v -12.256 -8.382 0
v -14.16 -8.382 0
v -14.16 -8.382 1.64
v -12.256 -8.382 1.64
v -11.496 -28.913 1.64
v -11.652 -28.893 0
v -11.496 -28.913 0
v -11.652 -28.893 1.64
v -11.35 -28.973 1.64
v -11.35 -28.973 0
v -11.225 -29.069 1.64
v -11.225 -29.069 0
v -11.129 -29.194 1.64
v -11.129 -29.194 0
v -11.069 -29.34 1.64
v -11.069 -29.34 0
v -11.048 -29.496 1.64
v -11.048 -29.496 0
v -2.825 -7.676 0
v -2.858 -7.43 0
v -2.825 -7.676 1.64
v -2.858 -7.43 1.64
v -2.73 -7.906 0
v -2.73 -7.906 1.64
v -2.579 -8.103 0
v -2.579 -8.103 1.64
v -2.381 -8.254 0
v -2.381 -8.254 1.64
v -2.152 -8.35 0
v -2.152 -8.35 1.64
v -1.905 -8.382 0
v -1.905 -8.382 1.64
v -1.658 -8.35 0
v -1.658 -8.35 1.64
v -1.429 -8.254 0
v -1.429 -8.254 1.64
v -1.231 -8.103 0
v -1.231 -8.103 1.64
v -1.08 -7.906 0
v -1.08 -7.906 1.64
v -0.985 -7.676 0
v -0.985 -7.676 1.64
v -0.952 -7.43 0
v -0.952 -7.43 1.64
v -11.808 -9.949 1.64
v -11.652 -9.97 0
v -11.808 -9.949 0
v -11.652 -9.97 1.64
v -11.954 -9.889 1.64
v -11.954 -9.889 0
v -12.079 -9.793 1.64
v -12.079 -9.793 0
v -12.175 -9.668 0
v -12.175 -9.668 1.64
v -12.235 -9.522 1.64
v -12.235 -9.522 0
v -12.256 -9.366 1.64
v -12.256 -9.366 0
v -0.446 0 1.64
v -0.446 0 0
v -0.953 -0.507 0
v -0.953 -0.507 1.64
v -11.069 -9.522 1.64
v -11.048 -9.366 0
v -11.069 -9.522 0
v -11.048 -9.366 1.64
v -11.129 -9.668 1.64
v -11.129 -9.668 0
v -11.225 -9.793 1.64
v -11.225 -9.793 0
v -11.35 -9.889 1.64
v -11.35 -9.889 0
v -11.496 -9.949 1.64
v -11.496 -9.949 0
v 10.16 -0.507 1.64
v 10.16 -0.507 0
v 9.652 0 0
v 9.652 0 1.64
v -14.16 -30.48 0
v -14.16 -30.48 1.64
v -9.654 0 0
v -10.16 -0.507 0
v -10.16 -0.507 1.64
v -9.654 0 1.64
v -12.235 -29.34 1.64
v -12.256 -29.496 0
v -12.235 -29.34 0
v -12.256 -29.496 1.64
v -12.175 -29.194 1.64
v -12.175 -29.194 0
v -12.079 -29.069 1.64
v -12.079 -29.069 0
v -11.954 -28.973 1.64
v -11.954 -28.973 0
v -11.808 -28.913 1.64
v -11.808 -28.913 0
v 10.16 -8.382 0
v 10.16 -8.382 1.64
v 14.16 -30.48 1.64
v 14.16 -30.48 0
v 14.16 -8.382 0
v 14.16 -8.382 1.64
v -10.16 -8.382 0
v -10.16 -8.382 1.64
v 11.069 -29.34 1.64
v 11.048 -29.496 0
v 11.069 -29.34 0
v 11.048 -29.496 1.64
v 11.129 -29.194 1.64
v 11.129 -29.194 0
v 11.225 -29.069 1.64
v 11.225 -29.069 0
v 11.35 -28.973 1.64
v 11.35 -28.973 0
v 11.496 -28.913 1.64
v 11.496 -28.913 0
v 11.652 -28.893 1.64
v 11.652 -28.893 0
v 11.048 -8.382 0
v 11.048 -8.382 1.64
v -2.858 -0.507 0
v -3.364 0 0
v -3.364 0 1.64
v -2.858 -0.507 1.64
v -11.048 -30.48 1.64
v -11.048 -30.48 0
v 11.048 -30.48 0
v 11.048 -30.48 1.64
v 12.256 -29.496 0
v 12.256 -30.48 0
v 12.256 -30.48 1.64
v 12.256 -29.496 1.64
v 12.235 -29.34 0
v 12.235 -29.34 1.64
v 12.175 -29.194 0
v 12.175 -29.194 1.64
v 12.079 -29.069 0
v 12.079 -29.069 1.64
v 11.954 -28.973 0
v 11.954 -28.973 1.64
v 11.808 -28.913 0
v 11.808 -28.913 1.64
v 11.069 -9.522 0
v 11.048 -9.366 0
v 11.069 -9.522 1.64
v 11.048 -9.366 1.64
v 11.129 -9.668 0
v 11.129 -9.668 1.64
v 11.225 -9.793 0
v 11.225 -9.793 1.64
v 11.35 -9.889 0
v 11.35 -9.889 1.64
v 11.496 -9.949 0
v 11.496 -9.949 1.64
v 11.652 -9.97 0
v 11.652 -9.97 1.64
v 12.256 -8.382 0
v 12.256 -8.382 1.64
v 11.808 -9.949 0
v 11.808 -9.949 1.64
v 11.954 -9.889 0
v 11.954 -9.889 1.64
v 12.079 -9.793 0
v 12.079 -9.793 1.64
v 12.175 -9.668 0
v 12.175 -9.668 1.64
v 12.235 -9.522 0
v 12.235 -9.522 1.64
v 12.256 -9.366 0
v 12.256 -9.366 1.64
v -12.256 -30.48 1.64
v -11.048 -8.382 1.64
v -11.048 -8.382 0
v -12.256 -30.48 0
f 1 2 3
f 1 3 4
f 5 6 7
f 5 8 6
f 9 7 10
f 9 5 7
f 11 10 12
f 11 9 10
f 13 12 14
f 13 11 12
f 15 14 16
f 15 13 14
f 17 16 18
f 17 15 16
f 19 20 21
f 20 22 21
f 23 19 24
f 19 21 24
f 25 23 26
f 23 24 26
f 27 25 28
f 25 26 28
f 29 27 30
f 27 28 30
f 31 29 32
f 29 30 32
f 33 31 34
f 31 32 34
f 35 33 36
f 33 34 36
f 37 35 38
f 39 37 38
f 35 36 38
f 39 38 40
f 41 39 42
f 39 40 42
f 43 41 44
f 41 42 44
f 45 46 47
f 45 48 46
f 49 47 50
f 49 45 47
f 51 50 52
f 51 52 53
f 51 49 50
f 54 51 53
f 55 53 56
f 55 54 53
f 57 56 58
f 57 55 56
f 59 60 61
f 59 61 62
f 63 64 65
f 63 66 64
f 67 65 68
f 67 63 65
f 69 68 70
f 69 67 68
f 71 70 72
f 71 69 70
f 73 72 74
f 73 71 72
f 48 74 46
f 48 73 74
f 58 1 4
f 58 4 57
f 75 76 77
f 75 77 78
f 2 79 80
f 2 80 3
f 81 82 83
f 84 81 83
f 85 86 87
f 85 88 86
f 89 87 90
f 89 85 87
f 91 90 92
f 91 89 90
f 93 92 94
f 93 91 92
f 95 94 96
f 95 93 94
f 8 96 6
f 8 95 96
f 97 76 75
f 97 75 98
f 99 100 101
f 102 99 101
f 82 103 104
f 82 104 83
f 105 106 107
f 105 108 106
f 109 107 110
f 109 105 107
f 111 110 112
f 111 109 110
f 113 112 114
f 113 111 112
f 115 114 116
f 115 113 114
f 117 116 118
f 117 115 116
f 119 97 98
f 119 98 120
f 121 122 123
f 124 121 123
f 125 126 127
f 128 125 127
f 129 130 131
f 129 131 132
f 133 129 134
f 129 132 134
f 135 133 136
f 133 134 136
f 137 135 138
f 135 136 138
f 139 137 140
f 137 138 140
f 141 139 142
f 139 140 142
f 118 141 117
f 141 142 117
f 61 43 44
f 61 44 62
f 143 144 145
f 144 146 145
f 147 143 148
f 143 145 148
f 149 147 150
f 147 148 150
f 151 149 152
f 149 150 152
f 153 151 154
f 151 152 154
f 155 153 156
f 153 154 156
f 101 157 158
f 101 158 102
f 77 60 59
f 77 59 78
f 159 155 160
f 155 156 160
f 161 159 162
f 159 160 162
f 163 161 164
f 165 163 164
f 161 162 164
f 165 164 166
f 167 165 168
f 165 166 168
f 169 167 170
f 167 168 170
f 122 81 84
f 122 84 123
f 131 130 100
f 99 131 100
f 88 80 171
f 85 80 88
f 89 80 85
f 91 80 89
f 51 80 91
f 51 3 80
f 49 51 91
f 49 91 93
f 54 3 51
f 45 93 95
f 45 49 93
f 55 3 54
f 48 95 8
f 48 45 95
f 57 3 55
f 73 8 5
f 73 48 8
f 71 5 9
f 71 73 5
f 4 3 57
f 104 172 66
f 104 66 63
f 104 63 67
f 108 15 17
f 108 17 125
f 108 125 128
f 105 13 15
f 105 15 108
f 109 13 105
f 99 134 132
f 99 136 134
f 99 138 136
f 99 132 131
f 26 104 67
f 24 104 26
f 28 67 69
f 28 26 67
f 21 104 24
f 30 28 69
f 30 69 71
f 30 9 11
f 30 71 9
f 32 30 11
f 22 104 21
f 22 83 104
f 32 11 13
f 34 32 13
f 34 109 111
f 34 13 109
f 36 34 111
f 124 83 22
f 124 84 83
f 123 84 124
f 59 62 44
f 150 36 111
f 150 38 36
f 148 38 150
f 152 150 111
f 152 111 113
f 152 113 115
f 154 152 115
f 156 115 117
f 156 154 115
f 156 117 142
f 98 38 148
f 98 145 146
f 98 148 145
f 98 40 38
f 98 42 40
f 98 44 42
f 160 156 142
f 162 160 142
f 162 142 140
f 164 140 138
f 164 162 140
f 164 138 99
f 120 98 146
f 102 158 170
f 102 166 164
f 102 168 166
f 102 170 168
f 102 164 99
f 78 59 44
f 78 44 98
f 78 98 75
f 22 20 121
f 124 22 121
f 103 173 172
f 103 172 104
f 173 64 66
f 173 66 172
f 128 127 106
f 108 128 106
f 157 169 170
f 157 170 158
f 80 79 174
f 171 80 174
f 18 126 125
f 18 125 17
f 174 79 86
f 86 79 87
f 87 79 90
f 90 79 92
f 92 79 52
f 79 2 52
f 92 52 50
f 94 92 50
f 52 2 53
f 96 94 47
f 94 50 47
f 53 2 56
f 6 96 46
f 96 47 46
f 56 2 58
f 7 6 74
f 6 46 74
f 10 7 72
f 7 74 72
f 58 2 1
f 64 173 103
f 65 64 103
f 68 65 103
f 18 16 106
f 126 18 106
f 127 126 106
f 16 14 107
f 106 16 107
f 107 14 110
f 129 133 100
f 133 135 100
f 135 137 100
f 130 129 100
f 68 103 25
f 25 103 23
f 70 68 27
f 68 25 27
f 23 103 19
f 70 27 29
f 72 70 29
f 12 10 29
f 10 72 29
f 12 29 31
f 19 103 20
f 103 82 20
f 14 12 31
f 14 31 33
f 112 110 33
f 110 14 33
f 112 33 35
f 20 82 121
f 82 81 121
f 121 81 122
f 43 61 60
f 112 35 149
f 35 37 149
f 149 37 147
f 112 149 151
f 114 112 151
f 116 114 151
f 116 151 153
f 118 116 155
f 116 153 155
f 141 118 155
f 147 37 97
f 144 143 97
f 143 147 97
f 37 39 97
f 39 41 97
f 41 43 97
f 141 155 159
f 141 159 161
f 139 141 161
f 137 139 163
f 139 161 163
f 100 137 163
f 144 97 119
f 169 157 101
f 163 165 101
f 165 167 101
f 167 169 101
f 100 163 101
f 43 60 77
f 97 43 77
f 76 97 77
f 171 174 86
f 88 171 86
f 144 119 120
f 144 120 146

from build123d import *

# Parameters (mm, degrees)
F0_W     = 28.321
F0_H     = 30.48
F1_DEPTH = 1.64
F2_W     = 1.905
F2_H     = 8.382
F2_W_2   = 1.207
F2_H_2   = 1.5875
F3_DEPTH = 25
F4_R     = 0.95249
F5_SIZE  = 0.507
F6_R     = 0.60349


# Not quite as in the source:
# - a fillet or chamfer is up to 0.001 mm smaller than in the source, because OpenCascade refuses the exact size


with BuildPart() as f1:
    # F0 (on Top) → F1 (new body)
    with BuildSketch(Plane.XY):
        with Locations((0, -15.24)):
            Rectangle(F0_W, F0_H)
    extrude(amount=F1_DEPTH)

    # F2 (on Top) → F3 (cut)
    with BuildSketch(Plane.XY):
        Polygon((-10.1605, 0), (-14.1605, 0), (-14.1605, -8.382), (-12.2555, -8.382), (-12.2555, -9.9695), (-11.0485, -9.9695), (-11.0485, -8.382), (-10.1605, -8.382), align=None)
        with Locations((-1.905, -4.191)):
            Rectangle(F2_W, F2_H)
        Polygon((14.1605, -8.382), (14.1605, 0), (10.1595, 0), (10.1595, -8.382), (11.0485, -8.382), (11.0485, -9.9695), (12.2555, -9.9695), (12.2555, -8.382), align=None)
        with Locations((-11.652, -29.68625)):
            Rectangle(F2_W_2, F2_H_2)
        with Locations((11.652, -29.68625)):
            Rectangle(F2_W_2, F2_H_2)
    extrude(amount=F3_DEPTH, mode=Mode.SUBTRACT)

    # F4 (radius 0.9525 in the source; OpenCascade refuses exactly that, so slightly less here)
    f4_edges = [f1.edges().sort_by_distance(p)[0] for p in [
        (-2.8575, -8.382, 0.82),
        (-0.9525, -8.382, 0.82),
    ]]
    fillet(f4_edges, radius=F4_R)

    # F5
    f5_edges = [f1.edges().sort_by_distance(p)[0] for p in [
        (10.1595, 0, 0.82),
        (-0.9525, 0, 0.82),
        (-2.8575, 0, 0.82),
        (-10.1605, 0, 0.82),
    ]]
    chamfer(f5_edges, length=F5_SIZE)

    # F6 (radius 0.6035 in the source; OpenCascade refuses exactly that, so slightly less here)
    f6_edges = [f1.edges().sort_by_distance(p)[0] for p in [
        (12.2555, -28.8925, 0.82),
        (-12.2555, -28.8925, 0.82),
        (-11.0485, -28.8925, 0.82),
        (11.0485, -28.8925, 0.82),
        (11.0485, -9.9695, 0.82),
        (12.2555, -9.9695, 0.82),
        (-12.2555, -9.9695, 0.82),
        (-11.0485, -9.9695, 0.82),
    ]]
    fillet(f6_edges, radius=F6_R)


solid = f1.part
